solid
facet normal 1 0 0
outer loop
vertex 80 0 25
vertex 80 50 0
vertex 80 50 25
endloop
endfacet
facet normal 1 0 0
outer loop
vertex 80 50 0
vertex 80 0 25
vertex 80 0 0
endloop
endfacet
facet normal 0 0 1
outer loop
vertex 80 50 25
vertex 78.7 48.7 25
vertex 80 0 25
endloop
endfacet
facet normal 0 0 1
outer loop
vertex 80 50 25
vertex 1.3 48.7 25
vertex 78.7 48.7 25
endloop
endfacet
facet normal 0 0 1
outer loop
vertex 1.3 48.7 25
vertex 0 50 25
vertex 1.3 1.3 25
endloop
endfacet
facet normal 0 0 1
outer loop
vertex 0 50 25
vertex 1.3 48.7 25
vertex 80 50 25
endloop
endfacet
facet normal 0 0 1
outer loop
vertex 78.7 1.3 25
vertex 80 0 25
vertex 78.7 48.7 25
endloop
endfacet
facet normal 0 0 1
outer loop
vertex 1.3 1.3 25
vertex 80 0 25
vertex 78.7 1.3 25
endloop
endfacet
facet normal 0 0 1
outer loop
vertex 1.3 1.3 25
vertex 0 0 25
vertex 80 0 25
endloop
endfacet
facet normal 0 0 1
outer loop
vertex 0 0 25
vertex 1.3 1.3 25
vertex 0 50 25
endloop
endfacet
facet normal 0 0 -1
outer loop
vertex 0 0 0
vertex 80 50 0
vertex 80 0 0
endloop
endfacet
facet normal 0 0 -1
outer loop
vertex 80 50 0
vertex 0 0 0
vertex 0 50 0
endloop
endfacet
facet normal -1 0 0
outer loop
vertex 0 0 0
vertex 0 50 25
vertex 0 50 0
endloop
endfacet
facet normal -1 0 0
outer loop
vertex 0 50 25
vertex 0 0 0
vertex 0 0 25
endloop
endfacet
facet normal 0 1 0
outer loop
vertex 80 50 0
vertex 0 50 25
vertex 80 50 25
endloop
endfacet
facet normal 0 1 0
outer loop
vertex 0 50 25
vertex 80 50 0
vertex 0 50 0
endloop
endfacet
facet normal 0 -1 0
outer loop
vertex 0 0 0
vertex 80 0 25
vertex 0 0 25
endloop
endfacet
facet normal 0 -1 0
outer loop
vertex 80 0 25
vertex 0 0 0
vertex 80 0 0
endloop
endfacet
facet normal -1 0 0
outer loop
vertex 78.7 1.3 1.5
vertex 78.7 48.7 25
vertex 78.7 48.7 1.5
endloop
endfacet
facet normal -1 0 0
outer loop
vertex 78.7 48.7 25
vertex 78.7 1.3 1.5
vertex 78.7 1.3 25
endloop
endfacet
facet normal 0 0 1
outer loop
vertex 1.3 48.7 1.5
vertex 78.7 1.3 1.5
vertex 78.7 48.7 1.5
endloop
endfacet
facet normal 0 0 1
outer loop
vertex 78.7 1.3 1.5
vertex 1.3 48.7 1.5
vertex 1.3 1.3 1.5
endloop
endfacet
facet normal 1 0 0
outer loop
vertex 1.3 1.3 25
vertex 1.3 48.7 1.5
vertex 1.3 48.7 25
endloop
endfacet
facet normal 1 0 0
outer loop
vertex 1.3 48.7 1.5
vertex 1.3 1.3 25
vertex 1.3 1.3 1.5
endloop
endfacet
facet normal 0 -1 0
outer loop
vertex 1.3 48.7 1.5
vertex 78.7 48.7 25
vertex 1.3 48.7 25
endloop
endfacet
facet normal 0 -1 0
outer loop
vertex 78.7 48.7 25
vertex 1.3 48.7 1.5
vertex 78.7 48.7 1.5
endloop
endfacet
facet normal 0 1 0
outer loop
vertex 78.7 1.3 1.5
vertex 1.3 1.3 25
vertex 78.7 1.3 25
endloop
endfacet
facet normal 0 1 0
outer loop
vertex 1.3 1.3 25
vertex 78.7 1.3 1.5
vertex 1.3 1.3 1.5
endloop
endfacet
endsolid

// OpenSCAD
$fn = 32;

// ----------------------------------------------------------------------
// Open box: 1.3 mm walls
// ----------------------------------------------------------------------

// --- parameters (mm) ---
box_l = 80;               // outer length, X
box_w = 50;               // outer width, Y
box_h = 25;               // outer height, Z
wall = 1.3;               // wall thickness
floor = 1.5;              // floor thickness
fit_tol = 0.1;            // tolerance for press fits, mm
free_tol = 0.5;           // tolerance for clearance fits, mm

difference() {
  cube([box_l, box_w, box_h]);
  translate([wall, wall, floor])
    cube([box_l - 2 * wall, box_w - 2 * wall, box_h]);
}
